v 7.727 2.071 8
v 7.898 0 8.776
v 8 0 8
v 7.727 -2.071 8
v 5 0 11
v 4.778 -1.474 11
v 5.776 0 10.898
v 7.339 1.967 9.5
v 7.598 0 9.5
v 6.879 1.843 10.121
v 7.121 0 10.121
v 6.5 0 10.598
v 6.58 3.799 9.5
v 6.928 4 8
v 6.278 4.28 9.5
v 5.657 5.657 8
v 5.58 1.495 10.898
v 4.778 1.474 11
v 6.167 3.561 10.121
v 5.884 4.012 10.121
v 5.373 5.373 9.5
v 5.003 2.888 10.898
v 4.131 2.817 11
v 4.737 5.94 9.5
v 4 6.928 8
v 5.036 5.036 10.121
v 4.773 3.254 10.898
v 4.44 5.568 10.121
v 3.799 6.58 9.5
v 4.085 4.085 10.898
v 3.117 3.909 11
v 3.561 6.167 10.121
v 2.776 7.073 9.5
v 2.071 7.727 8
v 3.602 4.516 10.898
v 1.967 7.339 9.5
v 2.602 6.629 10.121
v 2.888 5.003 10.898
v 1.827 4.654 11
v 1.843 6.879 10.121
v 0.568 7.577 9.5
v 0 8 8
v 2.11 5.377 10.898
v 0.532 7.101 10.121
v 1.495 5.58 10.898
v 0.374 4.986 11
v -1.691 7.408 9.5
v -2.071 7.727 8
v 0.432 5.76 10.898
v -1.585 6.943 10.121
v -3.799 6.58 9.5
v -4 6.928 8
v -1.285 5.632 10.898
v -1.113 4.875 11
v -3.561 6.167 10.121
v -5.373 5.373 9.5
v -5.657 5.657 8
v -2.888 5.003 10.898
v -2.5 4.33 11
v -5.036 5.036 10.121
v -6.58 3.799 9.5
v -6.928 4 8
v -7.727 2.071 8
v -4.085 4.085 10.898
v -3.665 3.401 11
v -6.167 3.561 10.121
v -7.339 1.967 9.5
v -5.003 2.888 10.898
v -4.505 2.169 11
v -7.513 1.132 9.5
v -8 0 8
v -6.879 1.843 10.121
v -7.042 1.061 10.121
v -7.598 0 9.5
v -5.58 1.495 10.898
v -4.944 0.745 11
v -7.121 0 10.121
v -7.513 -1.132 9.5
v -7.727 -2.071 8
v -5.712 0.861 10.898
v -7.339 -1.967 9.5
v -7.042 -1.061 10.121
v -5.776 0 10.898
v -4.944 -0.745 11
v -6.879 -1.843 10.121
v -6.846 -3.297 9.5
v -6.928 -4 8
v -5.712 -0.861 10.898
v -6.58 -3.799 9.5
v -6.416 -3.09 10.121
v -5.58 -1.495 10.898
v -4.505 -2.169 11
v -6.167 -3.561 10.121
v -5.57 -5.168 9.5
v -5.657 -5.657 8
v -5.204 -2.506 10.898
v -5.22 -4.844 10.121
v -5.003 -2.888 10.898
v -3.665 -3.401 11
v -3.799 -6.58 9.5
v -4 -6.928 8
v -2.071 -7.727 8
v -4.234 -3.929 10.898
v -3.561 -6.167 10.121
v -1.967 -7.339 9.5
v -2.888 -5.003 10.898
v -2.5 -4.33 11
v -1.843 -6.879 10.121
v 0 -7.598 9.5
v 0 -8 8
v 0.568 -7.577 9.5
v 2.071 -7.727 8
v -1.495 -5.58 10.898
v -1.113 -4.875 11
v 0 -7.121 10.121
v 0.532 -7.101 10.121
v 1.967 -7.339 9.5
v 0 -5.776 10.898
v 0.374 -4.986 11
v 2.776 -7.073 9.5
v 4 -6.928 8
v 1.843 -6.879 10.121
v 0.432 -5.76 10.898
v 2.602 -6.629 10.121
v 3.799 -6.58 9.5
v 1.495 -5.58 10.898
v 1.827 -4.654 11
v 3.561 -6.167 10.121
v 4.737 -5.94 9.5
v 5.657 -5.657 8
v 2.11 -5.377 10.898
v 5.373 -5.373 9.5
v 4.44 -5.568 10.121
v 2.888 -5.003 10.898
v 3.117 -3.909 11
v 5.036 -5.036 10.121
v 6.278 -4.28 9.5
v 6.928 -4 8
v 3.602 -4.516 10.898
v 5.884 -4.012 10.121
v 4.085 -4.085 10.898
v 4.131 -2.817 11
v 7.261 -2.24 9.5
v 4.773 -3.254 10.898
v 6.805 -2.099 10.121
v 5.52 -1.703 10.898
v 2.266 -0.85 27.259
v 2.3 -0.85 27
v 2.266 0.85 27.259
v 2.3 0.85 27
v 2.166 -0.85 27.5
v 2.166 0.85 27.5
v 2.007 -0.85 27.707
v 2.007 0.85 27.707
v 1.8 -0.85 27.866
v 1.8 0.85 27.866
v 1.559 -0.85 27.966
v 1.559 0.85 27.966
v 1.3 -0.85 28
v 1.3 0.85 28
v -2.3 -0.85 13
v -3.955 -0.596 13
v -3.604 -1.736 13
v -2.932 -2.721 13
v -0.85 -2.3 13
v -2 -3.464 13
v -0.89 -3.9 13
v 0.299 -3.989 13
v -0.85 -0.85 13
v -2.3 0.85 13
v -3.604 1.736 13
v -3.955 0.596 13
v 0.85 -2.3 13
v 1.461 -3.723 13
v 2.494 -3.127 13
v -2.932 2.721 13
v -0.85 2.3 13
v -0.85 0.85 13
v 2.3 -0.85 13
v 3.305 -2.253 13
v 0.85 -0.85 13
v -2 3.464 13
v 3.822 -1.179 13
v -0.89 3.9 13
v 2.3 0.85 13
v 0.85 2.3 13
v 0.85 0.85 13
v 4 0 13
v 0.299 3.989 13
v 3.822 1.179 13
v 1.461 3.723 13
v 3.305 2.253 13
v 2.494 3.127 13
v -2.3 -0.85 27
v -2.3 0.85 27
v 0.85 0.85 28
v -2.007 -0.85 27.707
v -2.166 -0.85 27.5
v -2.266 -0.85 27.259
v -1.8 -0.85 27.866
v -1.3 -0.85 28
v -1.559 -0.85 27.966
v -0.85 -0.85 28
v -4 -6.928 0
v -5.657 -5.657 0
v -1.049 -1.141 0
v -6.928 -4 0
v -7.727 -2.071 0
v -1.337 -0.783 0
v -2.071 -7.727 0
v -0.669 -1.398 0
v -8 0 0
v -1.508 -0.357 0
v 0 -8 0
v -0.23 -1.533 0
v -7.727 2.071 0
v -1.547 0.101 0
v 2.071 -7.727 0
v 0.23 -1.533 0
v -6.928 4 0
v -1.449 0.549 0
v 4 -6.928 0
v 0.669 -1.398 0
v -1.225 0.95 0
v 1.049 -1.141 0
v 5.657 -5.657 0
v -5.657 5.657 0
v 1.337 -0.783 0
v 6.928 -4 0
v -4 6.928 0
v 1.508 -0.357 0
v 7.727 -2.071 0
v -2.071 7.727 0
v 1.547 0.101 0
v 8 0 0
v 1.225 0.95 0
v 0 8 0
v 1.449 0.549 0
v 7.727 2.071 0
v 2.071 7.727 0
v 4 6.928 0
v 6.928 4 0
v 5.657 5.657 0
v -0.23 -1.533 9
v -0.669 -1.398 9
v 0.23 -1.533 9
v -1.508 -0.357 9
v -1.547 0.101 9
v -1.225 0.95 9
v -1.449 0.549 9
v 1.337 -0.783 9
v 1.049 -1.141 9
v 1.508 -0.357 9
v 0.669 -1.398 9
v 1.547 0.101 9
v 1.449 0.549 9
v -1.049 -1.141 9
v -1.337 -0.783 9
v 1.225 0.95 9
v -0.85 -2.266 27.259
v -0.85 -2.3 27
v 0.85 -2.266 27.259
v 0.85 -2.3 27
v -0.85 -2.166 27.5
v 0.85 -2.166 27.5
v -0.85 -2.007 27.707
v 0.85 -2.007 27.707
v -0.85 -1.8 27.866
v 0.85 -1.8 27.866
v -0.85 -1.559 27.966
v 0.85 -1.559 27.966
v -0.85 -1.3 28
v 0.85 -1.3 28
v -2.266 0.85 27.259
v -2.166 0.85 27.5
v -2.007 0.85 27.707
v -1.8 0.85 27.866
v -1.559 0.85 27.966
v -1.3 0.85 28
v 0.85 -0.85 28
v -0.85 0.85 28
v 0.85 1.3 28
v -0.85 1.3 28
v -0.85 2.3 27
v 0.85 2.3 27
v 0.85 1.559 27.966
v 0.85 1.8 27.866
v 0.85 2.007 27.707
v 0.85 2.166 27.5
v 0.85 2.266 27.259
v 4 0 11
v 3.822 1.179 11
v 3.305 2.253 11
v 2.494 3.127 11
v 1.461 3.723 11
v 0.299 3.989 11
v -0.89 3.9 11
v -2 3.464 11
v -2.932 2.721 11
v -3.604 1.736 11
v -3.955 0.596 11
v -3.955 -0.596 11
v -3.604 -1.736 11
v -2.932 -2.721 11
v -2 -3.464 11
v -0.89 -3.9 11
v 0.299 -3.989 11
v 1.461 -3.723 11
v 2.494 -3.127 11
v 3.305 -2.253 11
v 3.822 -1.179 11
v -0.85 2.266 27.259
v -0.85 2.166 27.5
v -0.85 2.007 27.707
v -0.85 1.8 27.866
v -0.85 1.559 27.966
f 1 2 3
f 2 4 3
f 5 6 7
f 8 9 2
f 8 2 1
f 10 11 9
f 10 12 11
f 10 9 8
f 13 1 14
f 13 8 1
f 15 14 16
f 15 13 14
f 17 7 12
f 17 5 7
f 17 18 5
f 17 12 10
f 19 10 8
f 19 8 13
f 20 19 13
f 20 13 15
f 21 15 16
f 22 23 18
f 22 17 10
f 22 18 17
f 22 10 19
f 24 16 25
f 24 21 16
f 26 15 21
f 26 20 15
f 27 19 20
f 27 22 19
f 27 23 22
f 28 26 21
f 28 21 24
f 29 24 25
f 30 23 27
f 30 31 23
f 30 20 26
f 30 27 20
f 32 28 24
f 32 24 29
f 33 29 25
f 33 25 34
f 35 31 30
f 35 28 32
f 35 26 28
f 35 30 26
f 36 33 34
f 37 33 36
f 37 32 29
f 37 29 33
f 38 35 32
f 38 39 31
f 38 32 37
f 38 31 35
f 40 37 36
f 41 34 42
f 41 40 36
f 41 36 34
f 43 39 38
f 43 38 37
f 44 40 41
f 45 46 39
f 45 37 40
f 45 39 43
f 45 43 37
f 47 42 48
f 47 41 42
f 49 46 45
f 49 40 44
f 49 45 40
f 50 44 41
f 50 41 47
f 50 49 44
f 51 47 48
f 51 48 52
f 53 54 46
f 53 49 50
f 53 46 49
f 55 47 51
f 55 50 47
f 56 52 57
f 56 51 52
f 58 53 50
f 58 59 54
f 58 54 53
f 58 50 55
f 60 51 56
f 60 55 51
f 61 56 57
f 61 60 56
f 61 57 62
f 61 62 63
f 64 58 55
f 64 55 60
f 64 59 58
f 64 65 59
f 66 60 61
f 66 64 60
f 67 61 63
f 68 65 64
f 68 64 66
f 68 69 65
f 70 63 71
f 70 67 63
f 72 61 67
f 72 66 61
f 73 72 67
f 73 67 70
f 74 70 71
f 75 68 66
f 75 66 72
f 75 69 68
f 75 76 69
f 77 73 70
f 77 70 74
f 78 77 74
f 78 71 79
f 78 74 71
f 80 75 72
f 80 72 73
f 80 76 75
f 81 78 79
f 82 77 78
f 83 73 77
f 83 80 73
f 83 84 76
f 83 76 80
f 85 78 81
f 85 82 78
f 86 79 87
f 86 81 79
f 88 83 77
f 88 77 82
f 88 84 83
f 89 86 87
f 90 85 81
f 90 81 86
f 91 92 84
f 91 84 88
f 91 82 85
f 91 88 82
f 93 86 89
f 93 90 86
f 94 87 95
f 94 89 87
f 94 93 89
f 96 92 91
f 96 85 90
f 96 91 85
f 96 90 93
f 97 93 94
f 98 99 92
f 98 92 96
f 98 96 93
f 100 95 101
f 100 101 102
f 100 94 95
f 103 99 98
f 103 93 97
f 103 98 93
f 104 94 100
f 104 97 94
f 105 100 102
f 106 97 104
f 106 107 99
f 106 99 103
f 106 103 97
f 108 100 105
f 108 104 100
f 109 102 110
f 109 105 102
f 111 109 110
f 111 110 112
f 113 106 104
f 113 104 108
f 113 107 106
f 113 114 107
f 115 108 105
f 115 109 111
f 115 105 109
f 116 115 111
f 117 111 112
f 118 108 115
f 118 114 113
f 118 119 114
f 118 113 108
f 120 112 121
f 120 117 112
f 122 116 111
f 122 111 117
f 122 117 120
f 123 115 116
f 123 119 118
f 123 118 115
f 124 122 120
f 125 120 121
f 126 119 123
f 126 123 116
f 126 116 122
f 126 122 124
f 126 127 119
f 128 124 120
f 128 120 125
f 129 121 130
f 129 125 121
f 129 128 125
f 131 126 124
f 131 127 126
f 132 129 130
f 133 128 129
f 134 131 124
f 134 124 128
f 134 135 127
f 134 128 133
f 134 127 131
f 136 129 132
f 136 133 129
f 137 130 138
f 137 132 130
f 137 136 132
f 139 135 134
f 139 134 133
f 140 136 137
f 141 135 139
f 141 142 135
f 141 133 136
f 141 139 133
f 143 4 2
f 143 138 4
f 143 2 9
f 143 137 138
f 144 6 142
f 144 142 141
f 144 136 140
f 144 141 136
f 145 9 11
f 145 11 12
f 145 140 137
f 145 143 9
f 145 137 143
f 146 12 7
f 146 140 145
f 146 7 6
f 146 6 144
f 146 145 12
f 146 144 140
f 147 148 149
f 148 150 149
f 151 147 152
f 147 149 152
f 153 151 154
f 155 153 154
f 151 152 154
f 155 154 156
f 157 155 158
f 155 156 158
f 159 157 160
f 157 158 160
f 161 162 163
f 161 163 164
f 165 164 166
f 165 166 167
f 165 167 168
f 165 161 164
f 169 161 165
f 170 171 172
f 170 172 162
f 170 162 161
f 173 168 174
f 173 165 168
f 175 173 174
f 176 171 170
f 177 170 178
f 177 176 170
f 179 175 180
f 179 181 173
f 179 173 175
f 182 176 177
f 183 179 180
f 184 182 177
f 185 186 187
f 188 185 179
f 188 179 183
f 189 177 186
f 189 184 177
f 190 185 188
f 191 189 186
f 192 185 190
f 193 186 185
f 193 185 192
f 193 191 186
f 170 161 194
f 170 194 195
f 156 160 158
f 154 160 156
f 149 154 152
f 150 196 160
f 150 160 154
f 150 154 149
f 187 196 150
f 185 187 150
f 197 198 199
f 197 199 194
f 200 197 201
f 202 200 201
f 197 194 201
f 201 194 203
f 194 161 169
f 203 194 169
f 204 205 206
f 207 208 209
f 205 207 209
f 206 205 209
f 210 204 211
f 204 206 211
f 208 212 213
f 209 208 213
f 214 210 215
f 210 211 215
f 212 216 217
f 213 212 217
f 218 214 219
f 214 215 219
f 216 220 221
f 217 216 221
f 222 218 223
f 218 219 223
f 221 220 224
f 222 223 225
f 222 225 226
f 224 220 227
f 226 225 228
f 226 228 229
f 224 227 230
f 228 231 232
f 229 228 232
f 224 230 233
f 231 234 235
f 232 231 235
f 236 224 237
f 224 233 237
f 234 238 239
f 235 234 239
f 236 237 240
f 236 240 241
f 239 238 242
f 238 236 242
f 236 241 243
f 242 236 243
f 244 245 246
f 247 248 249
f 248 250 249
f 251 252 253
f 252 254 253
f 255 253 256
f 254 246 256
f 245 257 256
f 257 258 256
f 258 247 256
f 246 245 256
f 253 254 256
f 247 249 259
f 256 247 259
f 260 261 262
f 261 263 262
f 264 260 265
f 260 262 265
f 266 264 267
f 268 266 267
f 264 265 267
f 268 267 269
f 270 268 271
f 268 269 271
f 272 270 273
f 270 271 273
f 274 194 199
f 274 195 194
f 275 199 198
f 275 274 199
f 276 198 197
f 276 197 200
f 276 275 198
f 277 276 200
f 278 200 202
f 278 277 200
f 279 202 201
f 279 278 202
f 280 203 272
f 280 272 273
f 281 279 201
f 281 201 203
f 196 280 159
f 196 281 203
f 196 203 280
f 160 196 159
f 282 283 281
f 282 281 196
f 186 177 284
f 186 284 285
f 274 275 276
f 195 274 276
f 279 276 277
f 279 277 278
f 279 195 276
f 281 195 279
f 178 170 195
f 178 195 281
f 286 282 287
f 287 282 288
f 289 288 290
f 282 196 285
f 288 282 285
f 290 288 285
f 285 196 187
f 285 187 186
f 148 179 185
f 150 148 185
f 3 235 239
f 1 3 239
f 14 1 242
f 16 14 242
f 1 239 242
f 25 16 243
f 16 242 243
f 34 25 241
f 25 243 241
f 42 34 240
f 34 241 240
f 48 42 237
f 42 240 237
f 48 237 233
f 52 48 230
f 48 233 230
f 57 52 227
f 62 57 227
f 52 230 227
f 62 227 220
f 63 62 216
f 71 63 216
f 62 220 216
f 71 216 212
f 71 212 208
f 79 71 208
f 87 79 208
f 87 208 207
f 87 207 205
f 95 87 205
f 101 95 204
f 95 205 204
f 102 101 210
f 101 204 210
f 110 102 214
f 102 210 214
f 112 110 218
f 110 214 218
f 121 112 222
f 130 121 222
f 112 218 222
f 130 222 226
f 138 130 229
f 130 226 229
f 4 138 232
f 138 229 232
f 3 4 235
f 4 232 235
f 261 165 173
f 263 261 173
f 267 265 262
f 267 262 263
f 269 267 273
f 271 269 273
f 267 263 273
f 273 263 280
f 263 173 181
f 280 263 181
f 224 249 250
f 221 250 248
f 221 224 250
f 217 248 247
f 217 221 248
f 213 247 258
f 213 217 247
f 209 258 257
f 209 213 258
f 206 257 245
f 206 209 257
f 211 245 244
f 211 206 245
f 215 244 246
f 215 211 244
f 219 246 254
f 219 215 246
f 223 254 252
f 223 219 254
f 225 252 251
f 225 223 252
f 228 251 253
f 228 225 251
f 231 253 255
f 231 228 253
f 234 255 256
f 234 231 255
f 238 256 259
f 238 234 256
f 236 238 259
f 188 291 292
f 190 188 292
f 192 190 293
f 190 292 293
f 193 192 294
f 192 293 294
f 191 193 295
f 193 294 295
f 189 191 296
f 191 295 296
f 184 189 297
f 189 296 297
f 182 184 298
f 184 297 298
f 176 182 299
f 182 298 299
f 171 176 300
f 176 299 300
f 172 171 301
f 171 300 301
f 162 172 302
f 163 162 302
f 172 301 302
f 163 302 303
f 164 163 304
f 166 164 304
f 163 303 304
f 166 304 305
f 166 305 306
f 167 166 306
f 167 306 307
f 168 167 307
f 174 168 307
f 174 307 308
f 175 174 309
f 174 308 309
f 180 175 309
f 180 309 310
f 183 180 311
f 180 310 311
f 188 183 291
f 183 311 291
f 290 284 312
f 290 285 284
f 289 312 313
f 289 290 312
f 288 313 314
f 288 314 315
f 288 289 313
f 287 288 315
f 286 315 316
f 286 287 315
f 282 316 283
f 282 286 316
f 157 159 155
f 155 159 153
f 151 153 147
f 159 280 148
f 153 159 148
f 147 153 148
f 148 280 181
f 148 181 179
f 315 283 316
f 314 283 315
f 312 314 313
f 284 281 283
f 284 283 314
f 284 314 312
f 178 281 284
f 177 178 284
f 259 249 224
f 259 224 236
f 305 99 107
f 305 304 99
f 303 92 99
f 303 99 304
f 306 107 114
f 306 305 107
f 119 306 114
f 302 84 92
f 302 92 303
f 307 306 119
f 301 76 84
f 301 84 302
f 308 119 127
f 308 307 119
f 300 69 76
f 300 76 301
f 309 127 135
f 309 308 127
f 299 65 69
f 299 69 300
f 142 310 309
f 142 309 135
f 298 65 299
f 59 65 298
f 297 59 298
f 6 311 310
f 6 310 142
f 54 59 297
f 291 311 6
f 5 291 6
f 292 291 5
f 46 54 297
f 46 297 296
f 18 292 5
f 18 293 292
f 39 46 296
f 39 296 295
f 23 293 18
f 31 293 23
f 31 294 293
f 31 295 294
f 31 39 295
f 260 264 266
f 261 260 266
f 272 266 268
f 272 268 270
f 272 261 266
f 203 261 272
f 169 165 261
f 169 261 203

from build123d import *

# Parameters (mm, degrees)
CYLINDER002_R     = 4
CYLINDER002_DEPTH = 2
CYLINDER001_R     = 1.55
CYLINDER001_DEPTH = 9
BOX_W             = 10
BOX_H             = 2.5
BOX_DEPTH         = 11
CYLINDER_R        = 8
CYLINDER_DEPTH    = 11
FILLET002_R       = 3
BOX002_W          = 4.6
BOX002_H          = 1.7
BOX002_DEPTH      = 15
FILLET001_R       = 1
BOX001_W          = 1.7
BOX001_H          = 4.6
BOX001_DEPTH      = 15
FILLET_R          = 1


with BuildPart() as cilindro002:
    # Cylinder002 → Cylinder002 (new body)
    with BuildSketch(Plane.XY.offset(11)):
        Circle(CYLINDER002_R)
    extrude(amount=CYLINDER002_DEPTH)


with BuildPart() as cilindro001:
    # Cylinder001 → Cylinder001 (new body)
    with BuildSketch(Plane.XY):
        Circle(CYLINDER001_R)
    extrude(amount=CYLINDER001_DEPTH)


with BuildPart() as taladro:
    # Box → Box (new body)
    with BuildSketch(Plane(origin=(-5, -1.55, 0), x_dir=(1, 0, 0), z_dir=(0, 0, 1))):
        with Locations((5, 1.25)):
            Rectangle(BOX_W, BOX_H)
    extrude(amount=BOX_DEPTH)

    # Common: intersect Cilindro001
    add(cilindro001.part, mode=Mode.INTERSECT)


with BuildPart() as fillet002:
    # Cylinder → Cylinder (new body)
    with BuildSketch(Plane.XY):
        Circle(CYLINDER_R)
    extrude(amount=CYLINDER_DEPTH)

    # Cut: cut Taladro
    add(taladro.part, mode=Mode.SUBTRACT)

    # Fillet002
    fillet002_edges = [fillet002.edges().sort_by_distance(p)[0] for p in [
        (-8, 0, 11),
    ]]
    fillet(fillet002_edges, radius=FILLET002_R)


with BuildPart() as fillet001:
    # Box002 → Box002 (new body)
    with BuildSketch(Plane(origin=(-2.3, -0.85, 22), x_dir=(1, 0, 0), z_dir=(0, 0, 1))):
        with Locations((2.3, 0.85)):
            Rectangle(BOX002_W, BOX002_H)
    extrude(amount=BOX002_DEPTH)

    # Fillet001
    fillet001_edges = [fillet001.edges().sort_by_distance(p)[0] for p in [
        (-2.3, 0, 37),
        (2.3, 0, 37),
    ]]
    fillet(fillet001_edges, radius=FILLET001_R)


with BuildPart() as eje_rueda_motor:
    # Box001 → Box001 (new body)
    with BuildSketch(Plane(origin=(-0.85, -2.3, 22), x_dir=(1, 0, 0), z_dir=(0, 0, 1))):
        with Locations((0.85, 2.3)):
            Rectangle(BOX001_W, BOX001_H)
    extrude(amount=BOX001_DEPTH)

    # Fillet
    fillet_edges = [eje_rueda_motor.edges().sort_by_distance(p)[0] for p in [
        (0, -2.3, 37),
        (0, 2.3, 37),
    ]]
    fillet(fillet_edges, radius=FILLET_R)

    # Fusion: union Fillet001
    add(fillet001.part)


with BuildPart() as eje_rueda_motor_1:
    # Fusion placement: moved
    add(eje_rueda_motor.part.moved(Location((0, 0, -9))))

    # Fusion001: union Cilindro002, Fillet002
    add(cilindro002.part)
    add(fillet002.part)


solid = eje_rueda_motor_1.part
